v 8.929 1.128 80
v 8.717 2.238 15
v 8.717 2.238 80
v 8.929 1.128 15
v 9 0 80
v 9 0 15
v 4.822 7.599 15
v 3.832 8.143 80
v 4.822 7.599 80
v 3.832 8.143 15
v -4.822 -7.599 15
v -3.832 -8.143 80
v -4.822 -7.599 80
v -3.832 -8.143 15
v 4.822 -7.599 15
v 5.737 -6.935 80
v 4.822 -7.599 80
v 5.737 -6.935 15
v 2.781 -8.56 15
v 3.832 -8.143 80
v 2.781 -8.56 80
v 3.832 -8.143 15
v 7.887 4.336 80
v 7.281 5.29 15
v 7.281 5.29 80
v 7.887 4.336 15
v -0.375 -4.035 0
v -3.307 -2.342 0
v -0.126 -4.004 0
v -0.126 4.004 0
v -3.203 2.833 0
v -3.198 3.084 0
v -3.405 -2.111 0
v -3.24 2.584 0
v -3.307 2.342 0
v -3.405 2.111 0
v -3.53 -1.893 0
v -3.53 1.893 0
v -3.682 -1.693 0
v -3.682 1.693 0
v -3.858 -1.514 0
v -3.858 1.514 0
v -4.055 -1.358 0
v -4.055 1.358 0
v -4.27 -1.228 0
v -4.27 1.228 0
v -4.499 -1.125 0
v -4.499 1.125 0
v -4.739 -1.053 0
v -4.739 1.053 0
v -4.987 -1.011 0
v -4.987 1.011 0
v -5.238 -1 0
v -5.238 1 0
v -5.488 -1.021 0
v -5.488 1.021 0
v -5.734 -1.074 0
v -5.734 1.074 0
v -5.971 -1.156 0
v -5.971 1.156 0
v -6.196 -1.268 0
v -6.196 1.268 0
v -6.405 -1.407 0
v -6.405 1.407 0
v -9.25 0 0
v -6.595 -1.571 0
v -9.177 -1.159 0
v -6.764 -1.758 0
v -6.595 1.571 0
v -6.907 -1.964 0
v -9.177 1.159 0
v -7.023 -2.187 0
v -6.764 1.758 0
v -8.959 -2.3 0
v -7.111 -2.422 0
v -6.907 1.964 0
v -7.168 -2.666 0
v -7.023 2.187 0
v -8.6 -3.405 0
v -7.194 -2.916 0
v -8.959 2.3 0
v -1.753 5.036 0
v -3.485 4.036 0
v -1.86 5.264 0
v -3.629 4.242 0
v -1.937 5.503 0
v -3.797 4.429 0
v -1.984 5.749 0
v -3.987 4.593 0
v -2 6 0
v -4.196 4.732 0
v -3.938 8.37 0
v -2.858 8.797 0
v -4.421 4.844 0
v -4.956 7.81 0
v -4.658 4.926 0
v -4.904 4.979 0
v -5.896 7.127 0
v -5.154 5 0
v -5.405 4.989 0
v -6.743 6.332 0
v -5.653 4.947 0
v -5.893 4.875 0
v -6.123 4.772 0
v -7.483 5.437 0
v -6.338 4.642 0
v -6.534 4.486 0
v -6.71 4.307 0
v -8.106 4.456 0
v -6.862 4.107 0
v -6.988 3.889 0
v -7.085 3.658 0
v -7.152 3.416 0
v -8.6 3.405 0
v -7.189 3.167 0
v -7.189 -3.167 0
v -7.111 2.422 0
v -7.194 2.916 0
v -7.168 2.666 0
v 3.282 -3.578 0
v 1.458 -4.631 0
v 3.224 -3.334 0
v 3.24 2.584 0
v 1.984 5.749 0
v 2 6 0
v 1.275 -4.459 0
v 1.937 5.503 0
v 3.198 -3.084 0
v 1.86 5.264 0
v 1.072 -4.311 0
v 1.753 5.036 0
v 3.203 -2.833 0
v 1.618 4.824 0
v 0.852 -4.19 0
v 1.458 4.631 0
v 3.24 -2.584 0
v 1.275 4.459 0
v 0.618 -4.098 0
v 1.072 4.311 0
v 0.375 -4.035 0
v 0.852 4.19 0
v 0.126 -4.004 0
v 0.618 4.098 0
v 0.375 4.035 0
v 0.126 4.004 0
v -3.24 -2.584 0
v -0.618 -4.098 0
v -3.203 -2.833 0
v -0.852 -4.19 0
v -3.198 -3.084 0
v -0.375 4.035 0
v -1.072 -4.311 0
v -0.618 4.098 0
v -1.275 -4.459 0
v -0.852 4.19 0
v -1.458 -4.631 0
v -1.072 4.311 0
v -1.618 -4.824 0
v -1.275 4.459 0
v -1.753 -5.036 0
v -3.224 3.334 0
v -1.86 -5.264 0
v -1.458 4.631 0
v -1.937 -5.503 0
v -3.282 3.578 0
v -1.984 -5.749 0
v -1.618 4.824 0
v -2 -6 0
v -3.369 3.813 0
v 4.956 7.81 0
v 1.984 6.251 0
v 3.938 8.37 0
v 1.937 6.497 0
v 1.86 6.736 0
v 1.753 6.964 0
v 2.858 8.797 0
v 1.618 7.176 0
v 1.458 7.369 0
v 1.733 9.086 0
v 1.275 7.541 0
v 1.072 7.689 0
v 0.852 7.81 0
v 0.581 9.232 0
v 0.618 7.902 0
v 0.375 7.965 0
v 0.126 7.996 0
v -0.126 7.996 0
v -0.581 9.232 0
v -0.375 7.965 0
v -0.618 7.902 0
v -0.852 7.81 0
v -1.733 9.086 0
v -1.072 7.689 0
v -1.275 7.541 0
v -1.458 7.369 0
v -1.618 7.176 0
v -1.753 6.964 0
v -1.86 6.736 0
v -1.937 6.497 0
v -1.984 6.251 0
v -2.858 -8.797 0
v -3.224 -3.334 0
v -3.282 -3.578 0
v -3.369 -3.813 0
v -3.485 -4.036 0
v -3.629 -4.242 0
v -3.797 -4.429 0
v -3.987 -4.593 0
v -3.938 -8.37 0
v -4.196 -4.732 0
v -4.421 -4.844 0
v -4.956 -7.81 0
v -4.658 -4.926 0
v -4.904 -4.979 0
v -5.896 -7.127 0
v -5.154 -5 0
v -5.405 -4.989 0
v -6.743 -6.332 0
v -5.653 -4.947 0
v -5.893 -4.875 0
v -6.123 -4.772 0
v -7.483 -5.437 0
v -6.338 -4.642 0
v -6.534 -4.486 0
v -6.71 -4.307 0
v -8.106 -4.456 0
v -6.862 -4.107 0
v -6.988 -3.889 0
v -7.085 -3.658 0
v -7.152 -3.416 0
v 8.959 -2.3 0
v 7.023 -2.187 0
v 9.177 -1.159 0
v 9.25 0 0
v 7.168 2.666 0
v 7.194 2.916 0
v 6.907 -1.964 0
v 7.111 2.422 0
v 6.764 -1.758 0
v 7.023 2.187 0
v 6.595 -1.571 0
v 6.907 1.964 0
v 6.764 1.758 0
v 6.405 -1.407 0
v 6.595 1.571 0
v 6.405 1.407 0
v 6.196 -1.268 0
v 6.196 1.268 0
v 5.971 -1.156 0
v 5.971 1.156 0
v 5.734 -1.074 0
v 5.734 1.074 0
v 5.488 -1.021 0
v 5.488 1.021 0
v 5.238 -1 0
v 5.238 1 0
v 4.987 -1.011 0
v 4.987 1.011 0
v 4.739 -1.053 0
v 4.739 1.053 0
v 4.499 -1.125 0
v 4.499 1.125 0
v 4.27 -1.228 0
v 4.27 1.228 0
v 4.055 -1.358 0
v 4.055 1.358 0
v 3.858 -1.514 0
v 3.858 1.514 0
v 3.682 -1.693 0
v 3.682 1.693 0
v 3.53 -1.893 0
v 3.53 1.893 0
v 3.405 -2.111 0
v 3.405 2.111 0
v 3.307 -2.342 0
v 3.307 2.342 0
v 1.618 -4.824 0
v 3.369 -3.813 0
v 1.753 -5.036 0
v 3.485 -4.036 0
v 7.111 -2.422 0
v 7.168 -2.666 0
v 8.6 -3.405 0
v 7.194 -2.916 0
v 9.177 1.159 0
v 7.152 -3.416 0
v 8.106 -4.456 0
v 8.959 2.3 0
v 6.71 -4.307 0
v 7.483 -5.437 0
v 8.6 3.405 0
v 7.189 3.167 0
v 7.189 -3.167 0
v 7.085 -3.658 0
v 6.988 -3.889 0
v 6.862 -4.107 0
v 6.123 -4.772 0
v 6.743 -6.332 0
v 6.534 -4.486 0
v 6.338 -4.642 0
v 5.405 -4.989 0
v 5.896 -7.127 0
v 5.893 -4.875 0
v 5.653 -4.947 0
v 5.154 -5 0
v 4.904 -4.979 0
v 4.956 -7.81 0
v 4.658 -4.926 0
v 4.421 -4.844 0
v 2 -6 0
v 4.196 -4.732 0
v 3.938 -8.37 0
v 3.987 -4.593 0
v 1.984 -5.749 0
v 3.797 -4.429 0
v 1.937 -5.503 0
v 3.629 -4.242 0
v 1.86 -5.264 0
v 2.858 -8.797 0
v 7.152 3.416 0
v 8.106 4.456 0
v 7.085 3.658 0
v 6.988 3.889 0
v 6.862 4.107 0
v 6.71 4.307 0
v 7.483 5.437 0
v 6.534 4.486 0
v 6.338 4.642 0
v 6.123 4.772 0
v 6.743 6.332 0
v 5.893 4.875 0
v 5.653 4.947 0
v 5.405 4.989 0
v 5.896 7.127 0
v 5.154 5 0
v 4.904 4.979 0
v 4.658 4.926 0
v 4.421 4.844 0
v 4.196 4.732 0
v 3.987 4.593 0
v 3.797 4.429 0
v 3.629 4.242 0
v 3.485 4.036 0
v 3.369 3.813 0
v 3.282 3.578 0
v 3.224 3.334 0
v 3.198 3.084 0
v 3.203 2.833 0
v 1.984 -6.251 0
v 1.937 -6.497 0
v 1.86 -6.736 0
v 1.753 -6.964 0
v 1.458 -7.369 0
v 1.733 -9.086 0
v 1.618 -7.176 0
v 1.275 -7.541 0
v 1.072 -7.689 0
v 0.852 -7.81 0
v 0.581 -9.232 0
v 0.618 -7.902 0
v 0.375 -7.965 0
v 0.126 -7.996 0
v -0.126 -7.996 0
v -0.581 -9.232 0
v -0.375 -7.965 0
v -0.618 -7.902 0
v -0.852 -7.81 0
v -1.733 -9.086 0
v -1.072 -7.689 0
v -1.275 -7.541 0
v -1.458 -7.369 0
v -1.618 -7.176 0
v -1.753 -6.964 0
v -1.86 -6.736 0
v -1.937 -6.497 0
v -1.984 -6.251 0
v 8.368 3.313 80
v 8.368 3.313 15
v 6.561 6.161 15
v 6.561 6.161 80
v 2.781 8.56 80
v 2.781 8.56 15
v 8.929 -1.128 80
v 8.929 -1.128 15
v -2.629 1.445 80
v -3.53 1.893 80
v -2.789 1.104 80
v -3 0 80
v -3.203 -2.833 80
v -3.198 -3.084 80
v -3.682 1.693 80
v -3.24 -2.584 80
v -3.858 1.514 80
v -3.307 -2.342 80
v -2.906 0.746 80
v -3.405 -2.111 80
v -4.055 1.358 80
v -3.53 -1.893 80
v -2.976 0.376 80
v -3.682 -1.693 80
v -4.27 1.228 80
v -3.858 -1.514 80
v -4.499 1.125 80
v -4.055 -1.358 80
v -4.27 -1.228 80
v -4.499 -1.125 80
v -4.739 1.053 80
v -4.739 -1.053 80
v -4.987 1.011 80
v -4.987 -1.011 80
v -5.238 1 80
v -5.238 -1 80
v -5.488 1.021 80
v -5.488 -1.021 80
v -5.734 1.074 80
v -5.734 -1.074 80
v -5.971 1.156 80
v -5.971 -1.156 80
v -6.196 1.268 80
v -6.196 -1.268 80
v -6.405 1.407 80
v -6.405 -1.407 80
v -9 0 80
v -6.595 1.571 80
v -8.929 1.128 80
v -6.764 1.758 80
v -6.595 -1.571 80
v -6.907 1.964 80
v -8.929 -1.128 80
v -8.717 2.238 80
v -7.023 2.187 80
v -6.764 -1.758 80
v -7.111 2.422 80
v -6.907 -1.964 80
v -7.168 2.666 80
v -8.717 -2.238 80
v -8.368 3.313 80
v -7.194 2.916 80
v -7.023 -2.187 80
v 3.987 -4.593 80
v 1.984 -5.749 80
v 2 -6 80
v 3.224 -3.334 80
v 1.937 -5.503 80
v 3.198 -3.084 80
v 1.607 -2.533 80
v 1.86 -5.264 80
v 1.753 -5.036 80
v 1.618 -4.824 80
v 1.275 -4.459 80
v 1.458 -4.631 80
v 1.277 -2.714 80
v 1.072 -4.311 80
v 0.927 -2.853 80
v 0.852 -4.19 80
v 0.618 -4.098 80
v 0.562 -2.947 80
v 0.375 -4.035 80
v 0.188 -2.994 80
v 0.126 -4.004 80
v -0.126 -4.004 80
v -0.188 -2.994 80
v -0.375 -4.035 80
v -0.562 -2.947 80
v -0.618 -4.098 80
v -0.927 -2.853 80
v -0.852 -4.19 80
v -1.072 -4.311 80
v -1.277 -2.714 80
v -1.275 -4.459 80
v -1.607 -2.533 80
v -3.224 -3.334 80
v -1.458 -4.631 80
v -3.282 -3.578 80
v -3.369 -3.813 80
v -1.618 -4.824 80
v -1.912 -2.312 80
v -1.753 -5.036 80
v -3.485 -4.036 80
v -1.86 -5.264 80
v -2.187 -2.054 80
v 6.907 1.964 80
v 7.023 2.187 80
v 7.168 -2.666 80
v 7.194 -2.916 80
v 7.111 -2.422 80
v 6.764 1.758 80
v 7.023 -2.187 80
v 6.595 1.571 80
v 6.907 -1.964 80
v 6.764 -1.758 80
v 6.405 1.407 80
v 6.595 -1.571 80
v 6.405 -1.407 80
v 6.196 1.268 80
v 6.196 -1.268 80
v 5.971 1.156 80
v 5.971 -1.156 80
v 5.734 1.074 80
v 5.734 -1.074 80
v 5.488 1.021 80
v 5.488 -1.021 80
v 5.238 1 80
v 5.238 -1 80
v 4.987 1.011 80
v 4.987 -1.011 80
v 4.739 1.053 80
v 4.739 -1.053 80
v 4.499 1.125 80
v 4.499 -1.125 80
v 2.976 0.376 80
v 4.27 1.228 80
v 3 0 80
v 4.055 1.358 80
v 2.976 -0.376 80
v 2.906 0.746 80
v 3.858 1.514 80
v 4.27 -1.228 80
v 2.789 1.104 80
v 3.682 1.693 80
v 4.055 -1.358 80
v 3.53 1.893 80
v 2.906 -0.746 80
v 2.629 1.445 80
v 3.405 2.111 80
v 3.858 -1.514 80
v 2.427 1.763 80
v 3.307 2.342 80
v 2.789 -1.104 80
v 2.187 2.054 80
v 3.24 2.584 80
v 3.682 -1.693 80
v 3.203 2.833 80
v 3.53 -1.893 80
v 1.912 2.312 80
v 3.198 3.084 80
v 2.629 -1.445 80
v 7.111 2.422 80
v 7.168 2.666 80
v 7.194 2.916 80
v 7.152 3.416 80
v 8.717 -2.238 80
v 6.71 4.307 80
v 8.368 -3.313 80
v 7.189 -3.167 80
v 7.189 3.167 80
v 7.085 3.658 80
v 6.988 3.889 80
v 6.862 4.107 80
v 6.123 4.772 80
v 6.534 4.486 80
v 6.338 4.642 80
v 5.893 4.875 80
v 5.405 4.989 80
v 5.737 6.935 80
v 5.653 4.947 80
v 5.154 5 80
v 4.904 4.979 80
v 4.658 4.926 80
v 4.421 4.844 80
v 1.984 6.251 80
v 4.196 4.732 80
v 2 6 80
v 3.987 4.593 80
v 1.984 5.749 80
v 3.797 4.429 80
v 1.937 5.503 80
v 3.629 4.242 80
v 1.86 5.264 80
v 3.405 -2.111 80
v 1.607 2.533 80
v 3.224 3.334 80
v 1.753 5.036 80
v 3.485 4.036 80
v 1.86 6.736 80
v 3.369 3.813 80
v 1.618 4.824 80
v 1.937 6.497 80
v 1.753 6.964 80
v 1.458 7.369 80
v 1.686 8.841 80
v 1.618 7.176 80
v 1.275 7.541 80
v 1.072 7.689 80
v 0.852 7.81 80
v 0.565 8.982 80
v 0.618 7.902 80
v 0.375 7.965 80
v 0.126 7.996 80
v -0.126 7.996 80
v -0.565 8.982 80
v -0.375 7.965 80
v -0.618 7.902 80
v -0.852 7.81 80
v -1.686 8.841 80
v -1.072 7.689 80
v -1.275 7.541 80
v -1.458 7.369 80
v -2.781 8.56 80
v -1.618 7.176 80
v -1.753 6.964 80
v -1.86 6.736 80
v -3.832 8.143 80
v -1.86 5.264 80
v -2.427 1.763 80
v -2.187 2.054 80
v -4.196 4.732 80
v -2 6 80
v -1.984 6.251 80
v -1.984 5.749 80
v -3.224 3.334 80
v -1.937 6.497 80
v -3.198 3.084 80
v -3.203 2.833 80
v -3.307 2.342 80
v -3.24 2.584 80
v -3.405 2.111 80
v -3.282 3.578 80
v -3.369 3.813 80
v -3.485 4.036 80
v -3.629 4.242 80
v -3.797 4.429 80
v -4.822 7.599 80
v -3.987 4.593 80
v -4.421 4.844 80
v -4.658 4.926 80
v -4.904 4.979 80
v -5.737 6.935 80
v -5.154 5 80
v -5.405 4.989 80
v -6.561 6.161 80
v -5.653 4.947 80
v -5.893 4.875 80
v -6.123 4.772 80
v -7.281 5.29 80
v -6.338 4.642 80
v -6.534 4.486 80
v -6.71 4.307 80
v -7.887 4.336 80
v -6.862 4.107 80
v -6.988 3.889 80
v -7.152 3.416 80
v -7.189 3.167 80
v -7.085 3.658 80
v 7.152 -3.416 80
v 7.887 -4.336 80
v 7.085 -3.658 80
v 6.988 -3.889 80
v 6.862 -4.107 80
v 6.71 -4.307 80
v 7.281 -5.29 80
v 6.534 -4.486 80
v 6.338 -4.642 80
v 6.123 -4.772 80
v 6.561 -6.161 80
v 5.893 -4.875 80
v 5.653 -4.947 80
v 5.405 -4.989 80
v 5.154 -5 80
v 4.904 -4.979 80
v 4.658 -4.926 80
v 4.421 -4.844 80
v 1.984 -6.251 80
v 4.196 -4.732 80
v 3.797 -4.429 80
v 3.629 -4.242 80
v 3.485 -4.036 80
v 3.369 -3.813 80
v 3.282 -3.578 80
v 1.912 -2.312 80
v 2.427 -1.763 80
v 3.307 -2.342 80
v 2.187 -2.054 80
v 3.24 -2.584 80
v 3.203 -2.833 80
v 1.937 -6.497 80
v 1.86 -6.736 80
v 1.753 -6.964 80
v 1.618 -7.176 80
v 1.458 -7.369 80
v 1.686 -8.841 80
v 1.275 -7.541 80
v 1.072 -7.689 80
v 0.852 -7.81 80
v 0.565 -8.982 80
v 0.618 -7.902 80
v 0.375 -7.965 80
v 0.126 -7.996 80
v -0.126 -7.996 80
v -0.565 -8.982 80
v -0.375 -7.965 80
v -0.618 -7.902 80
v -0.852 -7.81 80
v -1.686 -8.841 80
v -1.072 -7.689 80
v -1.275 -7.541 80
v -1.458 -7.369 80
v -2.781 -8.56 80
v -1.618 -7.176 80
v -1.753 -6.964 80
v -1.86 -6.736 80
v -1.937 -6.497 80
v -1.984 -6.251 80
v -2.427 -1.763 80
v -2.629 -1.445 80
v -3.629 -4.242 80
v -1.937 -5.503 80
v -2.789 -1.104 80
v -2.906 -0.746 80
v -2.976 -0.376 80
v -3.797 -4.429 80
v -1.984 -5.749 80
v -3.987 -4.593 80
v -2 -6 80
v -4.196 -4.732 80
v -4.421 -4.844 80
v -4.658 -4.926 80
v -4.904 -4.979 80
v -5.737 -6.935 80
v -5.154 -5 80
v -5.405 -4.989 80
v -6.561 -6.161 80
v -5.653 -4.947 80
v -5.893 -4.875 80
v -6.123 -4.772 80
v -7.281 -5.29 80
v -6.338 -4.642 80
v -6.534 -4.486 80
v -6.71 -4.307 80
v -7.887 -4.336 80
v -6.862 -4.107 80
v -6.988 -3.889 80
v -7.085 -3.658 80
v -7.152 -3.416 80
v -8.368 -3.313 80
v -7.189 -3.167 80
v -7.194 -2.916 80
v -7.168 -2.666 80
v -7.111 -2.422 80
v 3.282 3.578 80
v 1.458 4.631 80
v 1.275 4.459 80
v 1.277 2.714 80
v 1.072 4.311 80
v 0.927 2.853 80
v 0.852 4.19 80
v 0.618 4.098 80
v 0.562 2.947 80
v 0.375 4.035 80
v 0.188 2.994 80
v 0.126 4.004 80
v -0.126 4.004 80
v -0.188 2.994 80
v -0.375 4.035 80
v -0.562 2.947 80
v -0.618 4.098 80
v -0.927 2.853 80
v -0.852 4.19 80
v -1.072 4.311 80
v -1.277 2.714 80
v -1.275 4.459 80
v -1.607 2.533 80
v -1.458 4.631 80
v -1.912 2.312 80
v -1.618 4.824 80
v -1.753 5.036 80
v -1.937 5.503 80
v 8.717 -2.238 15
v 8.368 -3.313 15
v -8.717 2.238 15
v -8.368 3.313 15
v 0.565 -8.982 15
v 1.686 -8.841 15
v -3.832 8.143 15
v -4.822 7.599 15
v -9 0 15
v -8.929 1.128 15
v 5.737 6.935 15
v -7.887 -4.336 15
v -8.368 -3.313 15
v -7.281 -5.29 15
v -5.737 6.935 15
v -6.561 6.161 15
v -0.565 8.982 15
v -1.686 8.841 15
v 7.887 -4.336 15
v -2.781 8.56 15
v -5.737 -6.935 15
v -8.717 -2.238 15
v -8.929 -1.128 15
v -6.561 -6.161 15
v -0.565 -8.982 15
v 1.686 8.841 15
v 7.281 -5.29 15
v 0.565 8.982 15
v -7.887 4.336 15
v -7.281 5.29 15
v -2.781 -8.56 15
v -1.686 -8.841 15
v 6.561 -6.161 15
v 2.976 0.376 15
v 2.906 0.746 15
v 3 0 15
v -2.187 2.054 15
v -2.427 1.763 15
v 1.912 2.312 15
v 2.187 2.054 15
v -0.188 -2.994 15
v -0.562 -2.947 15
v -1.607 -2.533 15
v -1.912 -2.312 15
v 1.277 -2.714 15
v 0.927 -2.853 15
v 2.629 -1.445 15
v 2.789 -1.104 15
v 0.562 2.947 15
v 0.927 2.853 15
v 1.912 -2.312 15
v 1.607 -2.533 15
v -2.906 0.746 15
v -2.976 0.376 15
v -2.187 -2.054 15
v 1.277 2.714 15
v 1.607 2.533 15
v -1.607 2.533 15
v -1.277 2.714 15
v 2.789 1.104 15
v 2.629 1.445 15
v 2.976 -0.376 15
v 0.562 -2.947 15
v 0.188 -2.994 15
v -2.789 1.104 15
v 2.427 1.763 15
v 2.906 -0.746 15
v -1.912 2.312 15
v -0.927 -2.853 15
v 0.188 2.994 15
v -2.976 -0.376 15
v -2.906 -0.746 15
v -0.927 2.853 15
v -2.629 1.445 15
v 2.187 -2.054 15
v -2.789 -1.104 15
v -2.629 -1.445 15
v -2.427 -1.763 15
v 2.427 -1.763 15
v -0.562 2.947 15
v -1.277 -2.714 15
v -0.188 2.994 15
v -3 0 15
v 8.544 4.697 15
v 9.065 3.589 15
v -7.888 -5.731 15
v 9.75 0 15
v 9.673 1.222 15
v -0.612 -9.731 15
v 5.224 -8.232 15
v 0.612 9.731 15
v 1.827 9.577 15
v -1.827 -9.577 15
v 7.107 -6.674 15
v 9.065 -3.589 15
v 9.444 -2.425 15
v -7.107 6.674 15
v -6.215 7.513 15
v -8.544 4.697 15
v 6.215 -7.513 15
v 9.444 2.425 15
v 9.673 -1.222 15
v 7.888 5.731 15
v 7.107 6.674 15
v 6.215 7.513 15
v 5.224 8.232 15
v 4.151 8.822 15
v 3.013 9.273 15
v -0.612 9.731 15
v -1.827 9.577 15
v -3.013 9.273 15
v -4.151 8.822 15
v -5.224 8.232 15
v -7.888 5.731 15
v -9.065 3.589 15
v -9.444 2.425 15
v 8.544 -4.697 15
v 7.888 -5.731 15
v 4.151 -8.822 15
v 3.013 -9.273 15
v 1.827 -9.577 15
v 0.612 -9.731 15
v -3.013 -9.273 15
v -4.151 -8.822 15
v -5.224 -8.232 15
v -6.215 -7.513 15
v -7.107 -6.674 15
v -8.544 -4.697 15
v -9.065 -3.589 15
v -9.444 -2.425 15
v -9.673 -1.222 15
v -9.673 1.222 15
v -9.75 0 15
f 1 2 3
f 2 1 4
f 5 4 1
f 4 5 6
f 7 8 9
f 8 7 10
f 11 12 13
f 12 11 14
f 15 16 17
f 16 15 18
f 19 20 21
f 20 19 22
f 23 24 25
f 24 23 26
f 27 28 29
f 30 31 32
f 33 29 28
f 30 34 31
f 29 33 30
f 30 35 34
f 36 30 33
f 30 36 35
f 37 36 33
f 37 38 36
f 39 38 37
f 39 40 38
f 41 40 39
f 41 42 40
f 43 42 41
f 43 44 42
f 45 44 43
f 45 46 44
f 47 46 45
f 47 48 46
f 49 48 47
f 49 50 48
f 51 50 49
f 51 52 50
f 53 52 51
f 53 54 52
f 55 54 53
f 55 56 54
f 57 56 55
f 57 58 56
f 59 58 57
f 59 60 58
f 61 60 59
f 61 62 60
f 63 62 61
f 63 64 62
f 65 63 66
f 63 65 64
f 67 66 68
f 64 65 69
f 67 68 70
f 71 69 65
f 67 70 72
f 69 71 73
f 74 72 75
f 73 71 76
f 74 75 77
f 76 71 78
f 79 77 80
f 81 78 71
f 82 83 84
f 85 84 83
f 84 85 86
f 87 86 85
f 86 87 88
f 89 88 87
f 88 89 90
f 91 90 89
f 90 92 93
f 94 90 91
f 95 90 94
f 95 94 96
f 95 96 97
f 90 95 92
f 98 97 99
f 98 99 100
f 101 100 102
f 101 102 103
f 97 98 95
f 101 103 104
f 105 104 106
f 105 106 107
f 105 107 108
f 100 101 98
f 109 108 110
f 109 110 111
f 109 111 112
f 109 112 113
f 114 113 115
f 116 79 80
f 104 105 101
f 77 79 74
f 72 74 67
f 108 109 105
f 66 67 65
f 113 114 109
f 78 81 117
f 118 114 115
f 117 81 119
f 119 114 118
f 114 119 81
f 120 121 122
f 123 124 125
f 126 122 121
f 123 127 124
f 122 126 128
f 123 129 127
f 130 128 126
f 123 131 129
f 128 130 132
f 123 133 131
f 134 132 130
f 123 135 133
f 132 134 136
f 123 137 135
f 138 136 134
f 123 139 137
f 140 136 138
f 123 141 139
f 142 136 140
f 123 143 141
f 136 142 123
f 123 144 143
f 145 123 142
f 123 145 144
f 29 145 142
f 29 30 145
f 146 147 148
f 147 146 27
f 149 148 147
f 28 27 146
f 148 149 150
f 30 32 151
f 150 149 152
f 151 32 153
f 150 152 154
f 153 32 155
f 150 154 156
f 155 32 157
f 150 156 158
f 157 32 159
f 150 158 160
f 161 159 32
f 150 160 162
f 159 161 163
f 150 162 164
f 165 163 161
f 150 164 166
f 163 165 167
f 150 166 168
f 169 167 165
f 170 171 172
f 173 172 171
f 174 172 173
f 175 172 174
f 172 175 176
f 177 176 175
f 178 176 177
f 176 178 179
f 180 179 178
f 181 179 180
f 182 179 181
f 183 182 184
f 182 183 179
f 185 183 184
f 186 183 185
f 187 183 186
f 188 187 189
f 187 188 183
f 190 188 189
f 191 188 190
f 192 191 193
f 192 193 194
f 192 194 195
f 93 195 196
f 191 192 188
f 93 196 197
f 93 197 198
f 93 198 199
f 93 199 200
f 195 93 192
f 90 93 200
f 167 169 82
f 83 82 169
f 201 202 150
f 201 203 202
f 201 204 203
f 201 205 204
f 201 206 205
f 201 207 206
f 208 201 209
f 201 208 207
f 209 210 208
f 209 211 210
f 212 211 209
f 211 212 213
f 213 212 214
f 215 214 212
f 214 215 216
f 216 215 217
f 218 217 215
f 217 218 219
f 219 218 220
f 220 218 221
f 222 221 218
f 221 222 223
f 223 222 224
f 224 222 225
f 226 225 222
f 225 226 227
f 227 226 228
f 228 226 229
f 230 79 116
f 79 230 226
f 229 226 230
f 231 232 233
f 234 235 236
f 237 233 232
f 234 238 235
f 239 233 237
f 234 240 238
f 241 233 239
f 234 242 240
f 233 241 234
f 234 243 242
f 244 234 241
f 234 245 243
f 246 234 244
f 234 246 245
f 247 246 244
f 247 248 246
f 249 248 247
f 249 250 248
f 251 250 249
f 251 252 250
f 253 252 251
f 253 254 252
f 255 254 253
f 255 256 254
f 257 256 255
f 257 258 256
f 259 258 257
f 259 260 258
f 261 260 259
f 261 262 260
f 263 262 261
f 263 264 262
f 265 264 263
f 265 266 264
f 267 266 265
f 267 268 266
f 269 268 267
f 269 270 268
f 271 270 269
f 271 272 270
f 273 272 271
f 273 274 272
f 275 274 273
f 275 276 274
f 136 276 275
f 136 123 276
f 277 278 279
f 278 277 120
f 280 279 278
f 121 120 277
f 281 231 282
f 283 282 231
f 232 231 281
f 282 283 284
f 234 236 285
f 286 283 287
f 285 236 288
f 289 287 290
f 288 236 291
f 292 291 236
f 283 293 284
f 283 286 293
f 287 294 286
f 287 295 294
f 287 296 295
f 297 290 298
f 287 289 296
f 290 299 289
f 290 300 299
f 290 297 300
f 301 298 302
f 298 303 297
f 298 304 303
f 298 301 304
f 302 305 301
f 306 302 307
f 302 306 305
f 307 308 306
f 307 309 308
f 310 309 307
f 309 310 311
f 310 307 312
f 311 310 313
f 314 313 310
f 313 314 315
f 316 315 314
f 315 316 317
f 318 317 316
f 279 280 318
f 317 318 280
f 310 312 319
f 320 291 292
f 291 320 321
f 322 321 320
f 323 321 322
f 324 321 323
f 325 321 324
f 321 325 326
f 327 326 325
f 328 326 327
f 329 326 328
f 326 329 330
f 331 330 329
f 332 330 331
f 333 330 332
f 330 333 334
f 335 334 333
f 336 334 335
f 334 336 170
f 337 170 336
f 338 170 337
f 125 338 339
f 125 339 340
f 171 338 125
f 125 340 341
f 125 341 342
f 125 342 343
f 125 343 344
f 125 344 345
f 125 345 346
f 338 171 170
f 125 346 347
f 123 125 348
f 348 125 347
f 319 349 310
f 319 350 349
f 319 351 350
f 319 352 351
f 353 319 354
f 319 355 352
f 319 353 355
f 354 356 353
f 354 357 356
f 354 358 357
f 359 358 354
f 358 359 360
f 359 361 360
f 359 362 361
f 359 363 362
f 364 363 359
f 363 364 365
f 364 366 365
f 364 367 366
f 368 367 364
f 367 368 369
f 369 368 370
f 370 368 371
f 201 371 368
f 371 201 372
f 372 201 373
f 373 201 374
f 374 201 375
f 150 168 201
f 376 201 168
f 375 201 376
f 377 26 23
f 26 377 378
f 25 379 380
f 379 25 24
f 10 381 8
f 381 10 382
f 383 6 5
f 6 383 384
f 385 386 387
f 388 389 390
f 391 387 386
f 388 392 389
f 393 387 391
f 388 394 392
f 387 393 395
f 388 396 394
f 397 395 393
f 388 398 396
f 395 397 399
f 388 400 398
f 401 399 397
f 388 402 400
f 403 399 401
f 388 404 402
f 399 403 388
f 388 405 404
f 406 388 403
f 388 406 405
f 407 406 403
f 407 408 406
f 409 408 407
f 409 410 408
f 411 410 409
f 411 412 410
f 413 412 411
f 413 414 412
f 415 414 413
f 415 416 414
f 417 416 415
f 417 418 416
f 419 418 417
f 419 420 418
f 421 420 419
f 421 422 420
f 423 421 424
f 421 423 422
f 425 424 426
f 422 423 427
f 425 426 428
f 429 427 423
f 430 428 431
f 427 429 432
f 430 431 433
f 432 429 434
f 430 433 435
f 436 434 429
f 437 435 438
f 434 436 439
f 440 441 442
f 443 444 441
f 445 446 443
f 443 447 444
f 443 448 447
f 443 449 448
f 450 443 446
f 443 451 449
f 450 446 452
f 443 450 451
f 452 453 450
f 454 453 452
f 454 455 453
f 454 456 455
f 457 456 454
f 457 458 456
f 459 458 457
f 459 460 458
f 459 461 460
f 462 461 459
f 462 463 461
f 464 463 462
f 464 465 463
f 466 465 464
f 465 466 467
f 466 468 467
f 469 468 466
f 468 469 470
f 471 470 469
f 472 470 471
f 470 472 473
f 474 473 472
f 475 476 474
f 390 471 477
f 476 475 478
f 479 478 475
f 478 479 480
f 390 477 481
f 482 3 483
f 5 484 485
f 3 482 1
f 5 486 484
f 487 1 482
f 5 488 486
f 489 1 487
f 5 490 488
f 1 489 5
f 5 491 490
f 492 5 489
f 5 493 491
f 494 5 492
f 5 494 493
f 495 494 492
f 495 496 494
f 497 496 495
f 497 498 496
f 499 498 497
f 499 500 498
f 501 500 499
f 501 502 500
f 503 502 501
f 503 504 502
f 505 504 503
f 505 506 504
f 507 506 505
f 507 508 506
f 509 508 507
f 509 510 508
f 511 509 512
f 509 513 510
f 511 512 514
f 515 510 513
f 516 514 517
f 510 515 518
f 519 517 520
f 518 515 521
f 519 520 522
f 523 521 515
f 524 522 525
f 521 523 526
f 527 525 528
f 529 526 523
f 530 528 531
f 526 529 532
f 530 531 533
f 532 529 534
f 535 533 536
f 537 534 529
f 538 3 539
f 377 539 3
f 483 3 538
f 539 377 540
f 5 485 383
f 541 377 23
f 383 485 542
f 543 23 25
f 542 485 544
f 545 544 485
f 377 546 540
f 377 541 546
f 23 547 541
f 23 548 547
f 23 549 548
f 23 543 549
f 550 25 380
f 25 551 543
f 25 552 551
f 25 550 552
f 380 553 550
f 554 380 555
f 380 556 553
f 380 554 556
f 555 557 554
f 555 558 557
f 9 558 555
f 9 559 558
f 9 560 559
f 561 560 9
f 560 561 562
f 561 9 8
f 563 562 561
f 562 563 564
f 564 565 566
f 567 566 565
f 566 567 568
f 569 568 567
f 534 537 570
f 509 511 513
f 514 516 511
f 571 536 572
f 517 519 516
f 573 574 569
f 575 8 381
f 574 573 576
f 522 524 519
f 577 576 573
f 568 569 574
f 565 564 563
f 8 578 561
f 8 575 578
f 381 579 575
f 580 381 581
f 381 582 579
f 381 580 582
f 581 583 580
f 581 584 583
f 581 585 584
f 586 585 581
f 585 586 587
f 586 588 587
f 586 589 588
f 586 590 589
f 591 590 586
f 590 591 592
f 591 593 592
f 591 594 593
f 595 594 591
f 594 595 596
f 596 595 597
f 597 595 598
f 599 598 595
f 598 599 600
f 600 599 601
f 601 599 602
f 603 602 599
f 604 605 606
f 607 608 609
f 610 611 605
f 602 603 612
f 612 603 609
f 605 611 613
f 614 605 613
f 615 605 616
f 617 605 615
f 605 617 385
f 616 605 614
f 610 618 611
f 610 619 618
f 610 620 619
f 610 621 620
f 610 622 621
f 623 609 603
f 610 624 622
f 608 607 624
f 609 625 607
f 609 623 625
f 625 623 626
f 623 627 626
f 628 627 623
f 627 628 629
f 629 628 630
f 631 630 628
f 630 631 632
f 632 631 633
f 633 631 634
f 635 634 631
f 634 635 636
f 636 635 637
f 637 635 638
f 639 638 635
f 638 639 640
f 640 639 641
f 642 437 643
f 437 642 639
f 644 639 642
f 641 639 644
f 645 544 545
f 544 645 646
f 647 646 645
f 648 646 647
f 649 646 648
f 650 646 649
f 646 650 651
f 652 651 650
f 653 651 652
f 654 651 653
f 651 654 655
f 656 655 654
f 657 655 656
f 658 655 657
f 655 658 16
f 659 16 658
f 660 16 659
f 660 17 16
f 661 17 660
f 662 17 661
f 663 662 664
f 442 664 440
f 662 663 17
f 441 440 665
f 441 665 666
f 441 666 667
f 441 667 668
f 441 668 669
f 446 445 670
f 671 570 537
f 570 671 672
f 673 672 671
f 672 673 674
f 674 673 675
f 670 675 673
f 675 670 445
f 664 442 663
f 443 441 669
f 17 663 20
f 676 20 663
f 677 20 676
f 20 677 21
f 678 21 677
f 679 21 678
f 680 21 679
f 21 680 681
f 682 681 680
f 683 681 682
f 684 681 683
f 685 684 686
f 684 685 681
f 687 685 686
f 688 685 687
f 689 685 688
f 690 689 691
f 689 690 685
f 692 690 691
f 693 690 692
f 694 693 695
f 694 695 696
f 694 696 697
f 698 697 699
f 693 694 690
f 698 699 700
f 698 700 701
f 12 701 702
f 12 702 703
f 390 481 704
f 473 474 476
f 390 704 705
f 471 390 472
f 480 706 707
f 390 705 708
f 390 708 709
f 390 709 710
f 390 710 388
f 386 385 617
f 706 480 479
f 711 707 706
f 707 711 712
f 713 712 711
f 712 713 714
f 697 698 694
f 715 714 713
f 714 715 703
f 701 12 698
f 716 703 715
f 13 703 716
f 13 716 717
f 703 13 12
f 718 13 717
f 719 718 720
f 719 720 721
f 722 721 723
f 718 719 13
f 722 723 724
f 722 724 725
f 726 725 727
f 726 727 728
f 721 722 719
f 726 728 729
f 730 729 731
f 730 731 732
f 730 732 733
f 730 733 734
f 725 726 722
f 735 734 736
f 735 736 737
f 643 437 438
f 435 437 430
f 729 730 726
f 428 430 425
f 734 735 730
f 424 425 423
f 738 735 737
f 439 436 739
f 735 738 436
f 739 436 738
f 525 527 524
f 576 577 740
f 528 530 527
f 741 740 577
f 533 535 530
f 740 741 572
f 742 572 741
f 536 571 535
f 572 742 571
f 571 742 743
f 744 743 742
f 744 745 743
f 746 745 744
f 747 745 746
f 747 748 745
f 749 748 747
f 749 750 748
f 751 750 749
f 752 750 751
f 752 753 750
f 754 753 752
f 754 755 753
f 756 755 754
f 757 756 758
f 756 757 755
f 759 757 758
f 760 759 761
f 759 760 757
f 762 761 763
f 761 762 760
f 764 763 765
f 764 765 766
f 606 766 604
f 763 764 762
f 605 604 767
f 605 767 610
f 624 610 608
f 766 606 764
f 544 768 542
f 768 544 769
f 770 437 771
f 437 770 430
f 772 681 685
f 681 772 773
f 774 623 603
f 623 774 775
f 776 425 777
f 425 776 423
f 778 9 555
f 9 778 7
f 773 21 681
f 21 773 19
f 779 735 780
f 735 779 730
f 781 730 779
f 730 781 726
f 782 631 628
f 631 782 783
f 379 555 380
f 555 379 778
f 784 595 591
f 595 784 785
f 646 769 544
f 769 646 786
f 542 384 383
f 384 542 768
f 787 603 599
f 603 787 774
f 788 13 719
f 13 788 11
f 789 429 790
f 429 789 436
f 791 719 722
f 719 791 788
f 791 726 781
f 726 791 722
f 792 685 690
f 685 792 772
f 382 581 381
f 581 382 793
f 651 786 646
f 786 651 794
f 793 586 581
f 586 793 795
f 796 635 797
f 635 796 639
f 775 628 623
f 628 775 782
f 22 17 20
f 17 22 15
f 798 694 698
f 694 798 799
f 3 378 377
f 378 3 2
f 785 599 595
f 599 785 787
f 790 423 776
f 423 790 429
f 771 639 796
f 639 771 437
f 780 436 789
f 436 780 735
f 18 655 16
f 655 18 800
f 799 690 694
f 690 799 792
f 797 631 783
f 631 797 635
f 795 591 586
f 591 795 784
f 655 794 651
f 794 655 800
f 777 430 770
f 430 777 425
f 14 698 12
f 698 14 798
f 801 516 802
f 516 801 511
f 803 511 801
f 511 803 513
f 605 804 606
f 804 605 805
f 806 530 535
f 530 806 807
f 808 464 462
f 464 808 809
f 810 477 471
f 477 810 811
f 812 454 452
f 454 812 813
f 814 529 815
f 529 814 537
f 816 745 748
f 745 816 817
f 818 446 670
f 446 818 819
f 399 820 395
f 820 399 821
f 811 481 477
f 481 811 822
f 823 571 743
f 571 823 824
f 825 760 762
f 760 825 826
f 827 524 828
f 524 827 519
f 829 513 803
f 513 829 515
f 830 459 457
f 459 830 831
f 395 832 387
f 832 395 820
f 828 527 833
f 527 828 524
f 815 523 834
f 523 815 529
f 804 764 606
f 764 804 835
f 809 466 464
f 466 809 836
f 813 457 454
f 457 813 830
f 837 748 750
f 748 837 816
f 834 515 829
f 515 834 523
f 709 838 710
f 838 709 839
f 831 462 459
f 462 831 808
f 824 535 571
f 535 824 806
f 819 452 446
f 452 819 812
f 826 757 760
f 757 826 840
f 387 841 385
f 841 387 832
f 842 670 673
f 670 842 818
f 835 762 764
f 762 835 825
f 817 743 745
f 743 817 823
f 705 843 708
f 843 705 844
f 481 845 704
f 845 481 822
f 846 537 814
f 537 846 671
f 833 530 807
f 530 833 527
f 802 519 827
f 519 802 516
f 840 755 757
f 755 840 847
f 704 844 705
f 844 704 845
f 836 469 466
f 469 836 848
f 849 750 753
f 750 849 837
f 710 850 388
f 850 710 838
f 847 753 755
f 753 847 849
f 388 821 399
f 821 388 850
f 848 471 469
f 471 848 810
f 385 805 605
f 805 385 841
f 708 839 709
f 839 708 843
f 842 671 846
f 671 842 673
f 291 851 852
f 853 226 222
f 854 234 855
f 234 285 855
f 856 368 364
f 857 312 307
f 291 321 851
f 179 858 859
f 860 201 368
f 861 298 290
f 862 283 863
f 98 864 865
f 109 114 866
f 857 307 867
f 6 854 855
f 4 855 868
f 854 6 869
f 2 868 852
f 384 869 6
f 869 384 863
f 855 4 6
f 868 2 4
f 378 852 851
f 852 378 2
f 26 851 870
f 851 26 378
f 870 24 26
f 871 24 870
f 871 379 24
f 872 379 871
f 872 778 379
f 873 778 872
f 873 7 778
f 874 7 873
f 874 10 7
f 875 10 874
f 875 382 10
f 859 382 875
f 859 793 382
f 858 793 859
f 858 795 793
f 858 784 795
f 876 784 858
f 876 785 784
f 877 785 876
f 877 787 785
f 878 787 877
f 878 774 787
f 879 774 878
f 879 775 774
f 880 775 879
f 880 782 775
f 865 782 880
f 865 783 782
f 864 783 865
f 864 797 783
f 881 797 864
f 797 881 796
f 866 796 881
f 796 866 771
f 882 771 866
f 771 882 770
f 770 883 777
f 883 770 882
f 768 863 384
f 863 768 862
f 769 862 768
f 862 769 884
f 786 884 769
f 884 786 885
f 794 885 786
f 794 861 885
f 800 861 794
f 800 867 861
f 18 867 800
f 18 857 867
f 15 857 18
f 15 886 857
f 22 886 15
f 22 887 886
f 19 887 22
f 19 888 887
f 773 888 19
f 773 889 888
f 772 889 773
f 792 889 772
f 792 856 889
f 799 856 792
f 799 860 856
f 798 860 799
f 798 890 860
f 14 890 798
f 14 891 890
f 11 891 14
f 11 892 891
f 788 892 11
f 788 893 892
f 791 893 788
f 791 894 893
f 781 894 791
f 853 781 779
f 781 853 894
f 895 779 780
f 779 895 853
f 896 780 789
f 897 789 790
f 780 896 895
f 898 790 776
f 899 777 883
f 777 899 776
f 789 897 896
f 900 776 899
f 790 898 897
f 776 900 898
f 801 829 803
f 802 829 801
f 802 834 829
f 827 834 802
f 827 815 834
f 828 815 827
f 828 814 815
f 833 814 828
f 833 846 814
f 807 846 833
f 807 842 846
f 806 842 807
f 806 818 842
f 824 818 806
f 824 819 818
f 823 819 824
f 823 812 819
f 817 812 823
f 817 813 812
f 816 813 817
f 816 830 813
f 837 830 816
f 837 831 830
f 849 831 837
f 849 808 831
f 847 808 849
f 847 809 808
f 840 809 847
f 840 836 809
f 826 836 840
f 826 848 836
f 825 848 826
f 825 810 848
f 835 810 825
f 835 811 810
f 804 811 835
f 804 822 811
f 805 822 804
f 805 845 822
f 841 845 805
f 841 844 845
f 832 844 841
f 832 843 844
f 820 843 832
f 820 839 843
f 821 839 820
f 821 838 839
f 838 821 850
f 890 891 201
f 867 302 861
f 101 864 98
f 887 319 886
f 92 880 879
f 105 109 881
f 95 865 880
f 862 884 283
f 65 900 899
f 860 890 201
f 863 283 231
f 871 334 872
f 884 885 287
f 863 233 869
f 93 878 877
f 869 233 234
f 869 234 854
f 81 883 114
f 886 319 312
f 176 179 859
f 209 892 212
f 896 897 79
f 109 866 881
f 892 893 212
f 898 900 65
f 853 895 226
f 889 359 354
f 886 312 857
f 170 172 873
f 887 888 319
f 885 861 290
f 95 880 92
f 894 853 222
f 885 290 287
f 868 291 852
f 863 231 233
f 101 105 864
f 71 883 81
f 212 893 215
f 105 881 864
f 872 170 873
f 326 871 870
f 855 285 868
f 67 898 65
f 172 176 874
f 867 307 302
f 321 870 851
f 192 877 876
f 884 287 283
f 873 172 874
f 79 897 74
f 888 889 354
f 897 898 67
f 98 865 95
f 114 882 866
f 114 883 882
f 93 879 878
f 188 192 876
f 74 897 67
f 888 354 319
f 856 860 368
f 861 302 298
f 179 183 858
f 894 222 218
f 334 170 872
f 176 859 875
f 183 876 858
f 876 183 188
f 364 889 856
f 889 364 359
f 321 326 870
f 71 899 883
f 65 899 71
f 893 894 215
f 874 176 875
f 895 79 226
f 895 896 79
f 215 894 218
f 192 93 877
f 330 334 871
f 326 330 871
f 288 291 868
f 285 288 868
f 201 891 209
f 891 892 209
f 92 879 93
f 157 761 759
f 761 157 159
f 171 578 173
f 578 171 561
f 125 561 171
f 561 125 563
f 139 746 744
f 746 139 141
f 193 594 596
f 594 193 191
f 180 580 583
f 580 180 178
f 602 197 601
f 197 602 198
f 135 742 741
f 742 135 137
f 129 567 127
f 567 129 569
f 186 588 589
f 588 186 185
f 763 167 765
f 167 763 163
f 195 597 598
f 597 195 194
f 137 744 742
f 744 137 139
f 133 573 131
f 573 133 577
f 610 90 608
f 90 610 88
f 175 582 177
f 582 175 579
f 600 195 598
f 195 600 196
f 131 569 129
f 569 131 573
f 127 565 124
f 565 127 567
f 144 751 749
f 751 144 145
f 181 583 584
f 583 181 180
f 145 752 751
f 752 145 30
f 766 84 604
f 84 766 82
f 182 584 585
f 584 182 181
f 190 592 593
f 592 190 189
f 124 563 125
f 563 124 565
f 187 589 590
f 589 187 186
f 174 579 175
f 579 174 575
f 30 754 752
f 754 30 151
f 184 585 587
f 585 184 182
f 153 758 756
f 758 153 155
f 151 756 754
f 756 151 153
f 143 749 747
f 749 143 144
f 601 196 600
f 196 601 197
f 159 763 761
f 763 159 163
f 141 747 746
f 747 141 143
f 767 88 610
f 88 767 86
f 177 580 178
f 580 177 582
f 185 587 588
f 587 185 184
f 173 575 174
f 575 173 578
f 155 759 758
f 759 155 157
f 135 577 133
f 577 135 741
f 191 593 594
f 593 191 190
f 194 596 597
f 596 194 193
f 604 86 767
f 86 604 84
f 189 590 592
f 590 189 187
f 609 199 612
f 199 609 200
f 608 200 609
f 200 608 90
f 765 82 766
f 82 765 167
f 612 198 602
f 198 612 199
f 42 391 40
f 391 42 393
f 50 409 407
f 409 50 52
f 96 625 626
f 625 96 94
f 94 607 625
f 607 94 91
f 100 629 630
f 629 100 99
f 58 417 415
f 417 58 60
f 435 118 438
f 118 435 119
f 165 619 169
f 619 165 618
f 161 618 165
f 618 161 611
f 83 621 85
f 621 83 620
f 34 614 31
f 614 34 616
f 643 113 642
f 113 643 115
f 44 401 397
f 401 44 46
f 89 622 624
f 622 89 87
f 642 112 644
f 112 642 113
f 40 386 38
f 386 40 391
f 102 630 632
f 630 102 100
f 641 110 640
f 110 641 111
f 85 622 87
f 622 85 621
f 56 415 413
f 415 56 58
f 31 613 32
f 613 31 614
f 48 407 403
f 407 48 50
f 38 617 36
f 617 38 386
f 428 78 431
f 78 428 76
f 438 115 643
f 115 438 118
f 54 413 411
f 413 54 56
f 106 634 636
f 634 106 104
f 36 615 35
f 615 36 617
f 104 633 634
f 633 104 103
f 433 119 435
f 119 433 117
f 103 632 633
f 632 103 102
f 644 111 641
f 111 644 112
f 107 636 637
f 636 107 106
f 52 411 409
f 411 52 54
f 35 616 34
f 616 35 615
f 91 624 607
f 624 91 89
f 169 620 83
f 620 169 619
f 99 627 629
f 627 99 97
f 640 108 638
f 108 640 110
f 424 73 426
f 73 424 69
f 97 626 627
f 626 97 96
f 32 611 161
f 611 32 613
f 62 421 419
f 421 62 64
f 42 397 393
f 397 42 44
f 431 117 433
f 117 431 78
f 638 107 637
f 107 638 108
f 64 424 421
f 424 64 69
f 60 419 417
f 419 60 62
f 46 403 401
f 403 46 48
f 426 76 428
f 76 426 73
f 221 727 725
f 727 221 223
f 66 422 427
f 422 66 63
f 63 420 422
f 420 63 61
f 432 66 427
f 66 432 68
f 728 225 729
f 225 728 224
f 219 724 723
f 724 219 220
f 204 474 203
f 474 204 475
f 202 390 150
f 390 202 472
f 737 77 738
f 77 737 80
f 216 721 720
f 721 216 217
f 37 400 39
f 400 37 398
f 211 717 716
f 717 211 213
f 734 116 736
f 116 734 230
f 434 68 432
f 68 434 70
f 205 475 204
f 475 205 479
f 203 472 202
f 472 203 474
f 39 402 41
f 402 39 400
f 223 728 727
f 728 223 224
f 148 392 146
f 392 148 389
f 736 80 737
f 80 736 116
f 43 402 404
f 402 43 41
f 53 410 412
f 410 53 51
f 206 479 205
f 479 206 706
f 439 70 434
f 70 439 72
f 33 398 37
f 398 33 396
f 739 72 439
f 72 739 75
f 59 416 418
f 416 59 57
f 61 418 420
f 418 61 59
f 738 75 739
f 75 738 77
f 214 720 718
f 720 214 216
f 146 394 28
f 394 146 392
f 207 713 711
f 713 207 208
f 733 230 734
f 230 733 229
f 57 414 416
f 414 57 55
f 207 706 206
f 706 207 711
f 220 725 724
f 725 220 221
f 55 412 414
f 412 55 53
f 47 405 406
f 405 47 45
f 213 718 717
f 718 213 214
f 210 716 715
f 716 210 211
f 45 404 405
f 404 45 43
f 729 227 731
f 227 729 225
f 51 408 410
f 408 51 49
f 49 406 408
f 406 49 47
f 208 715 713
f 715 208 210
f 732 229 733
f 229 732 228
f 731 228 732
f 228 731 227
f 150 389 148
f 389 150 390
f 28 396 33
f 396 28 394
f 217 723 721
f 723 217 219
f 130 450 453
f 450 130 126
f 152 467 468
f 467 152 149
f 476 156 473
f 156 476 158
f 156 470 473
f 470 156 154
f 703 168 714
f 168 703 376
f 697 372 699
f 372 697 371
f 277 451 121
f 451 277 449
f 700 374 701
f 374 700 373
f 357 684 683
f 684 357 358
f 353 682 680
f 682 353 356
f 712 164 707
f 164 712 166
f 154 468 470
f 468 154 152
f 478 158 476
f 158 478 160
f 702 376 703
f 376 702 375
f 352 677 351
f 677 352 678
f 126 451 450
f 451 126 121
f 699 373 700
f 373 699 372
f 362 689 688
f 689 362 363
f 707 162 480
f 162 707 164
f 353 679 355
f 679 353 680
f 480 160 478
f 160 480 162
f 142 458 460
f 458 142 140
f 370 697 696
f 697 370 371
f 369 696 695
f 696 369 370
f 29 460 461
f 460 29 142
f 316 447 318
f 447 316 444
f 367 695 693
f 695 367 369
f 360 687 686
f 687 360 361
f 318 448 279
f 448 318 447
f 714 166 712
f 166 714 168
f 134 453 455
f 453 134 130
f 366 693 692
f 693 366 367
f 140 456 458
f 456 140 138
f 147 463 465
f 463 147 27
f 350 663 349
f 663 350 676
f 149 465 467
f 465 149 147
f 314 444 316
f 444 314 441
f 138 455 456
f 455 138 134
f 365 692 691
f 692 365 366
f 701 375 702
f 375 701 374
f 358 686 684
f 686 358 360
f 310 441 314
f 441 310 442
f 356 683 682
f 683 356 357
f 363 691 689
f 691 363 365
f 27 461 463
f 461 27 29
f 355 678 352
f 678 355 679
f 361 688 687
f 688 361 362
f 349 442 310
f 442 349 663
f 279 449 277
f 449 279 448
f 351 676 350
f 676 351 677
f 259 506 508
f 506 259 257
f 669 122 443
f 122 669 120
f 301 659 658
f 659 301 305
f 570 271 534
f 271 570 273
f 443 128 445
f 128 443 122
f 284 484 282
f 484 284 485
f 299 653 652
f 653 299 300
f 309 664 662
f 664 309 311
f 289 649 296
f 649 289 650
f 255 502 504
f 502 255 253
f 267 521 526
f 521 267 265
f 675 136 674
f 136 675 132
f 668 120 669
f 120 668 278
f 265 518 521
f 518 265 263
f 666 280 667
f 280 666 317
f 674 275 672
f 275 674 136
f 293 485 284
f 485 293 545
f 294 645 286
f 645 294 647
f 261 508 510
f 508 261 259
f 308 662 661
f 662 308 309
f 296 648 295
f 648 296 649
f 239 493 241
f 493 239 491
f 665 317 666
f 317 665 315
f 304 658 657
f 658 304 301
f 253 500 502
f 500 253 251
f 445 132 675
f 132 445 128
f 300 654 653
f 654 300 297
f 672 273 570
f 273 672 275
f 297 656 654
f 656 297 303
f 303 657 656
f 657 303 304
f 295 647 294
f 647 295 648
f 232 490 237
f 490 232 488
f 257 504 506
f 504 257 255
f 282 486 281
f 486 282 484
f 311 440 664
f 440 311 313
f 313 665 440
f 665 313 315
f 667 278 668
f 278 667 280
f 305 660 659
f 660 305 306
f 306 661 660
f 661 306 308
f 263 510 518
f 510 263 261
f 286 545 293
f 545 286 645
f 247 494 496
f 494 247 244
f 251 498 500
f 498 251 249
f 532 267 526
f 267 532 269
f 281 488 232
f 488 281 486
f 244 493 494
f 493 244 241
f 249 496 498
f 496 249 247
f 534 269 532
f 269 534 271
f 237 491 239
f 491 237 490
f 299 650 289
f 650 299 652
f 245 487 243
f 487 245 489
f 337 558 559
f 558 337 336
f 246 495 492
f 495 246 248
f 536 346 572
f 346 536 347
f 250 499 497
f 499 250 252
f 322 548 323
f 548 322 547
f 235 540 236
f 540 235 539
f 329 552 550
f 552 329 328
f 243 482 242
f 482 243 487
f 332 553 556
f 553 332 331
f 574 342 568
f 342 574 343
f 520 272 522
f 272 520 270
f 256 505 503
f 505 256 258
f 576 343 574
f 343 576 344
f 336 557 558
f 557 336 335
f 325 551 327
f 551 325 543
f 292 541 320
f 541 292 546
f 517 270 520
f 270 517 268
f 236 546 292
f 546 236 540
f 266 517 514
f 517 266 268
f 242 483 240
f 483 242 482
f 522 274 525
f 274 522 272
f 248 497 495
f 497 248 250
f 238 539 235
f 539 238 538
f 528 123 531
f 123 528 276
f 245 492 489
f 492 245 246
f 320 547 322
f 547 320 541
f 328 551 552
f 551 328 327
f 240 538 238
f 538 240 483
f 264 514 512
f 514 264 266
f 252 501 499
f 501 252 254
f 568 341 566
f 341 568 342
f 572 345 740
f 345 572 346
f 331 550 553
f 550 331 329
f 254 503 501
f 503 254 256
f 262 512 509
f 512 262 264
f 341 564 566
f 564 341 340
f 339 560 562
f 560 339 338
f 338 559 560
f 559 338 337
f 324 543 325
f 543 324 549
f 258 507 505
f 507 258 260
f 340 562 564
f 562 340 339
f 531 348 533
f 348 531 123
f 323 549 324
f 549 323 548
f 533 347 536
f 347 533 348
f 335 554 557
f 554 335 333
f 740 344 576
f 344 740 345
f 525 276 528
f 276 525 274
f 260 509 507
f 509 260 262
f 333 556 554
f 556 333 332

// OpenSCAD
$fn=50;
schliffRadius1=18.5/2;
schliffRadius2=19.5/2;
x=6;
module heizer() {
    difference() {
        union(){difference() {
            cylinder(r=9,h=80);
            cylinder(r=3,h=80);
        }cylinder(r1=schliffRadius1,r2=schliffRadius2,h=15);}
        for(i=[0:1:x])rotate(a=[0,0,i*360/x])translate([0,6])cylinder(r=2,h=80);
    }
}
heizer();
